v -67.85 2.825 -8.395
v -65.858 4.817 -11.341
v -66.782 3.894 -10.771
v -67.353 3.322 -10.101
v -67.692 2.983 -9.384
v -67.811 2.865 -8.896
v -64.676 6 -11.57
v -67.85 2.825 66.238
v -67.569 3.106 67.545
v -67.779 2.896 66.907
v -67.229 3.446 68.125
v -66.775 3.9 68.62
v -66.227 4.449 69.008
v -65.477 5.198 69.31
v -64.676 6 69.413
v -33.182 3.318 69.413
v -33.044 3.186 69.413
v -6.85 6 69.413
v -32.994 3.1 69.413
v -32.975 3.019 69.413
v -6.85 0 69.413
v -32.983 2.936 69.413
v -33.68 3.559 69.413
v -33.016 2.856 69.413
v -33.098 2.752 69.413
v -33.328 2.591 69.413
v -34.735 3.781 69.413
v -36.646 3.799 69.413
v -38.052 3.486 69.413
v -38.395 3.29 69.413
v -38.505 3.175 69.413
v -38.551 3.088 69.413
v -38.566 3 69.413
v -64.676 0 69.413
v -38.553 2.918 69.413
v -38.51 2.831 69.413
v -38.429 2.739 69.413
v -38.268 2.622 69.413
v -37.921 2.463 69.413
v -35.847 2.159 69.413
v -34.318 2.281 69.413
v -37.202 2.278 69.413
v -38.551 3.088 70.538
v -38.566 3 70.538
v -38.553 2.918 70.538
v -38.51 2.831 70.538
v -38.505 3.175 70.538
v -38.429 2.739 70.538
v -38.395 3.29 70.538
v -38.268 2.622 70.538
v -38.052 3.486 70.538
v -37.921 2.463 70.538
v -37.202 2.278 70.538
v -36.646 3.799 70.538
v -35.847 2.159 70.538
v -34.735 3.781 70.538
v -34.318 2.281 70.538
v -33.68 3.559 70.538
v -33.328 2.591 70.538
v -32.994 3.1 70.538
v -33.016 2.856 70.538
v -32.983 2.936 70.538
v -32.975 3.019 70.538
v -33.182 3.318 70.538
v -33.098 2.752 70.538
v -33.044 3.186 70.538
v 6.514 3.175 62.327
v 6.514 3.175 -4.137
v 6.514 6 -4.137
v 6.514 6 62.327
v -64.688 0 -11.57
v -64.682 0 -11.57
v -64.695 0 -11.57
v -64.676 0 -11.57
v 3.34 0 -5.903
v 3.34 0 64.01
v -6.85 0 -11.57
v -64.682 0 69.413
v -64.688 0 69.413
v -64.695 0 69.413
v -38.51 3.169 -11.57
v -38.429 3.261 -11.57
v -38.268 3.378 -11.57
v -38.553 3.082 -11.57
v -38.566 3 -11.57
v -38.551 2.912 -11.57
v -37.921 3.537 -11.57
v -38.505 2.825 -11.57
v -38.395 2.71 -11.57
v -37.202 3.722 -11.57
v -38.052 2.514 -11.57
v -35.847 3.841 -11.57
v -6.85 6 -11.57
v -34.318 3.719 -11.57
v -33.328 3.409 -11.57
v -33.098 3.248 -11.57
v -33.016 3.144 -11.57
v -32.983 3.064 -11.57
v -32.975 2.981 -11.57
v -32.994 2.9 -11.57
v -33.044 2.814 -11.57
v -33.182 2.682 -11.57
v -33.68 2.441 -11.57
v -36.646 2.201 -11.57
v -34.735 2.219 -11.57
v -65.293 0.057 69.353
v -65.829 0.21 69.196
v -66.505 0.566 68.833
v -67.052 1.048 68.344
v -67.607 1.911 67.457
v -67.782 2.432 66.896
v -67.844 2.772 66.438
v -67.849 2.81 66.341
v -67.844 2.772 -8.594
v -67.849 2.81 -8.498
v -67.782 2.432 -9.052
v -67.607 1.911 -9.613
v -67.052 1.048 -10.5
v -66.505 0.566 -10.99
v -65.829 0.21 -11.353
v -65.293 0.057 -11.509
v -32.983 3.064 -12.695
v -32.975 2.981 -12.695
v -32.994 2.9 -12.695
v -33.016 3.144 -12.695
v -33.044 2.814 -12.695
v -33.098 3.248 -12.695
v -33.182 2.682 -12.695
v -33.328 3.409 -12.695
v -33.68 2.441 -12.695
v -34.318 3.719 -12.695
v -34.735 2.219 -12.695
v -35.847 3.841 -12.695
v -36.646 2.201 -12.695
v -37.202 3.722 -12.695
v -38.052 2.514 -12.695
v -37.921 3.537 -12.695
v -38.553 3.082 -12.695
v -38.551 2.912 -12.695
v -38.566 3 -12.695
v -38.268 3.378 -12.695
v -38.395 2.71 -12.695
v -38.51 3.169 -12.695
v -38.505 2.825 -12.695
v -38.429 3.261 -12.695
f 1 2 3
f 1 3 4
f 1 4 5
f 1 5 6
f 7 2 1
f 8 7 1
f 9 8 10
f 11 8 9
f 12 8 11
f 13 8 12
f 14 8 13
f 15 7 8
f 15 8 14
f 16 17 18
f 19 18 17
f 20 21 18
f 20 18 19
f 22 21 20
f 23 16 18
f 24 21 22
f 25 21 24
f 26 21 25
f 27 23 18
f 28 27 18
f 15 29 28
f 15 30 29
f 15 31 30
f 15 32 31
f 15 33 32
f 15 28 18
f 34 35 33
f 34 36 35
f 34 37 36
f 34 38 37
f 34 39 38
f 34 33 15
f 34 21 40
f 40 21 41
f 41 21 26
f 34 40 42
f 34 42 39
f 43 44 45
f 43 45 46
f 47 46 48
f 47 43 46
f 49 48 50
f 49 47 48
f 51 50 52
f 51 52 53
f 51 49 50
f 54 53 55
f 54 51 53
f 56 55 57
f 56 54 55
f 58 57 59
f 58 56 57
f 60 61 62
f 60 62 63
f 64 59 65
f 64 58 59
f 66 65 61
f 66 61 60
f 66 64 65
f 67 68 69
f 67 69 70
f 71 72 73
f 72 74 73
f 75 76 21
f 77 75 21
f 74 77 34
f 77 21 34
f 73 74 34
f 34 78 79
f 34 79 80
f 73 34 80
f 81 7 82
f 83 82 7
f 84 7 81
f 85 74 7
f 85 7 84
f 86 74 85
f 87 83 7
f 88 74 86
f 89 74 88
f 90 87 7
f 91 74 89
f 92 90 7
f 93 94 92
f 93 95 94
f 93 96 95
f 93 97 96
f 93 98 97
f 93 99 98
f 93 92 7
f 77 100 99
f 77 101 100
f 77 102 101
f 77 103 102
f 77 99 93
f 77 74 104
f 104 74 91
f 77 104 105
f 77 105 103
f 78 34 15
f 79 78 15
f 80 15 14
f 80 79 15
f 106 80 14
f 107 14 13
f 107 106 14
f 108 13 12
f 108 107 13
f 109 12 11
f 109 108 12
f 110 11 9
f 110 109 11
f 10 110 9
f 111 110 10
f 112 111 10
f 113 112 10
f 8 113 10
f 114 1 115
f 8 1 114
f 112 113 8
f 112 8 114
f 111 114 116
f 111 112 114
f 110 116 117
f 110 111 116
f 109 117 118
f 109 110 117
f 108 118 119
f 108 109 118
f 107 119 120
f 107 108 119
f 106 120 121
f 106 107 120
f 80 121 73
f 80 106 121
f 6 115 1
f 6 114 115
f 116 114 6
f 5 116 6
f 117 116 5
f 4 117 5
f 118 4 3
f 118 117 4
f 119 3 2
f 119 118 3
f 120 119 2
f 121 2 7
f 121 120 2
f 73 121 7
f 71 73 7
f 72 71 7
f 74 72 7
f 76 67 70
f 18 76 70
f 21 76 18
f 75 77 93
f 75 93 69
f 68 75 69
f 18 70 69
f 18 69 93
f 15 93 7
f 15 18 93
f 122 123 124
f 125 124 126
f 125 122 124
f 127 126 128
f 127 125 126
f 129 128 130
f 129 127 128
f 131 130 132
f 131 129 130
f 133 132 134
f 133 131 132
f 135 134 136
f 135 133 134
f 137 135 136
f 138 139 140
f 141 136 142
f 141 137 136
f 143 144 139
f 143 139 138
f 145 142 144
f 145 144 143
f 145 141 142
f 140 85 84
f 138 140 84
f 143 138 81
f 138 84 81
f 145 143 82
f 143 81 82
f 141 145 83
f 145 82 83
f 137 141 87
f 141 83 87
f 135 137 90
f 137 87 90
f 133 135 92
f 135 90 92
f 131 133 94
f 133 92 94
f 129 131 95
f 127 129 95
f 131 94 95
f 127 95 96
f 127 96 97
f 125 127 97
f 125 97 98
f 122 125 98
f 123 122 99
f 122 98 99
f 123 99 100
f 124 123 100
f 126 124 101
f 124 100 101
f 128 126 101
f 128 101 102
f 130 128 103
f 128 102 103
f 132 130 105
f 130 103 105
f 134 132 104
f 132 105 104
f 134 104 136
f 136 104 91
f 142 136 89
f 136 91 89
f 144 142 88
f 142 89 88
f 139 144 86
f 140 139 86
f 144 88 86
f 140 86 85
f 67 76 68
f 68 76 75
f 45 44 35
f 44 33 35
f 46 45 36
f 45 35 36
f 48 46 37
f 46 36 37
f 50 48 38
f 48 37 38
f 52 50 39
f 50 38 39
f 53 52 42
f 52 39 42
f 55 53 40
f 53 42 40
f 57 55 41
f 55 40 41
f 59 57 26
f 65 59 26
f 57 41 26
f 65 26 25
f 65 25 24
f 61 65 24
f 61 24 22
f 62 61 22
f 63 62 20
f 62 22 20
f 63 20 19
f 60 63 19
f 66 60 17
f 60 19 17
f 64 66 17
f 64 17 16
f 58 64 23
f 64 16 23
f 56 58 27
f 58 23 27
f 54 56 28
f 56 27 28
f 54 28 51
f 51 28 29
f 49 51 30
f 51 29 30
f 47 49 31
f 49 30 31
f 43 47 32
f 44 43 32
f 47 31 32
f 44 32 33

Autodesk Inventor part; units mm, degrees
ref_plane "YZ Plane" through (0, 0, 0) normal (1, 0, 0) x (0, 1, 0)
ref_plane "XZ Plane" through (0, 0, 0) normal (0, 1, 0) x (-1, 0, 0)
ref_plane "XY Plane" through (0, 0, 0) normal (0, 0, 1) x (1, 0, 0)
sketch "Sketch1" plane through (0, 0, 0) normal (0, 1, 0) x (-1, 0, 0)
  line L0 (67.8505, 69.4133) -> (67.8505, -11.5697)
  line L1 (67.8505, -11.5697) -> (6.8505, -11.5697)
  line L2 (6.8505, -11.5697) -> (-6.5145, -4.1373)
  line L3 (-6.5145, -4.1373) -> (-6.5145, 62.3267)
  line L4 (-6.5145, 62.3267) -> (6.8505, 69.4133)
  line L5 (6.8505, 69.4133) -> (67.8505, 69.4133)
extrude "Extrusion1" add sketch "Sketch1" along normal blind 6
sketch "Sketch2" plane through (-6.8505, 0, -11.5697) normal (0, 0, -1) x (-1, 0, 0)
  line L0 (0, 0) -> (0, 6) construction
  ellipse E0 centre (28.92, 3) end of major axis (31.716, 3) minor radius 0.841
  line L1 (-13.365, 0) -> (-13.365, 6) construction
  point P0 (-6.8505, 0)
  dimension "d9" = 2.796
  dimension "d12" = 0.841
  dimension "d11" = 28.92
extrude "Extrusion2" add sketch "Sketch2" along normal blind 1.125
sketch "Sketch3" plane through (-67.8505, 0, 69.4133) normal (0, 0, 1) x (1, 0, 0)
  ellipse E0 centre (32.08, 3) end of major axis (34.876, 3) minor radius 0.841 construction
  ellipse E1 centre (32.08, 3) end of major axis (29.284, 3) minor radius 0.841
  point P0 (67.8505, 0)
extrude "Extrusion3" add sketch "Sketch3" along normal blind 1.125
chamfer "Chamfer1" distance 3.175 angle 45 1 edges at (-67.8505, 6, 28.9218)
fillet "Fillet1" radius 3.175 3 edges at (-67.8505, 0, 28.9218) (-67.8505, 1.4125, -11.5697) (-67.8505, 1.4125, 69.4133)
chamfer "Chamfer2" distance 3.175 angle 45 1 edges at (6.5145, 0, 29.0947)
properties part number "Moto G3 Phone Case Back"
